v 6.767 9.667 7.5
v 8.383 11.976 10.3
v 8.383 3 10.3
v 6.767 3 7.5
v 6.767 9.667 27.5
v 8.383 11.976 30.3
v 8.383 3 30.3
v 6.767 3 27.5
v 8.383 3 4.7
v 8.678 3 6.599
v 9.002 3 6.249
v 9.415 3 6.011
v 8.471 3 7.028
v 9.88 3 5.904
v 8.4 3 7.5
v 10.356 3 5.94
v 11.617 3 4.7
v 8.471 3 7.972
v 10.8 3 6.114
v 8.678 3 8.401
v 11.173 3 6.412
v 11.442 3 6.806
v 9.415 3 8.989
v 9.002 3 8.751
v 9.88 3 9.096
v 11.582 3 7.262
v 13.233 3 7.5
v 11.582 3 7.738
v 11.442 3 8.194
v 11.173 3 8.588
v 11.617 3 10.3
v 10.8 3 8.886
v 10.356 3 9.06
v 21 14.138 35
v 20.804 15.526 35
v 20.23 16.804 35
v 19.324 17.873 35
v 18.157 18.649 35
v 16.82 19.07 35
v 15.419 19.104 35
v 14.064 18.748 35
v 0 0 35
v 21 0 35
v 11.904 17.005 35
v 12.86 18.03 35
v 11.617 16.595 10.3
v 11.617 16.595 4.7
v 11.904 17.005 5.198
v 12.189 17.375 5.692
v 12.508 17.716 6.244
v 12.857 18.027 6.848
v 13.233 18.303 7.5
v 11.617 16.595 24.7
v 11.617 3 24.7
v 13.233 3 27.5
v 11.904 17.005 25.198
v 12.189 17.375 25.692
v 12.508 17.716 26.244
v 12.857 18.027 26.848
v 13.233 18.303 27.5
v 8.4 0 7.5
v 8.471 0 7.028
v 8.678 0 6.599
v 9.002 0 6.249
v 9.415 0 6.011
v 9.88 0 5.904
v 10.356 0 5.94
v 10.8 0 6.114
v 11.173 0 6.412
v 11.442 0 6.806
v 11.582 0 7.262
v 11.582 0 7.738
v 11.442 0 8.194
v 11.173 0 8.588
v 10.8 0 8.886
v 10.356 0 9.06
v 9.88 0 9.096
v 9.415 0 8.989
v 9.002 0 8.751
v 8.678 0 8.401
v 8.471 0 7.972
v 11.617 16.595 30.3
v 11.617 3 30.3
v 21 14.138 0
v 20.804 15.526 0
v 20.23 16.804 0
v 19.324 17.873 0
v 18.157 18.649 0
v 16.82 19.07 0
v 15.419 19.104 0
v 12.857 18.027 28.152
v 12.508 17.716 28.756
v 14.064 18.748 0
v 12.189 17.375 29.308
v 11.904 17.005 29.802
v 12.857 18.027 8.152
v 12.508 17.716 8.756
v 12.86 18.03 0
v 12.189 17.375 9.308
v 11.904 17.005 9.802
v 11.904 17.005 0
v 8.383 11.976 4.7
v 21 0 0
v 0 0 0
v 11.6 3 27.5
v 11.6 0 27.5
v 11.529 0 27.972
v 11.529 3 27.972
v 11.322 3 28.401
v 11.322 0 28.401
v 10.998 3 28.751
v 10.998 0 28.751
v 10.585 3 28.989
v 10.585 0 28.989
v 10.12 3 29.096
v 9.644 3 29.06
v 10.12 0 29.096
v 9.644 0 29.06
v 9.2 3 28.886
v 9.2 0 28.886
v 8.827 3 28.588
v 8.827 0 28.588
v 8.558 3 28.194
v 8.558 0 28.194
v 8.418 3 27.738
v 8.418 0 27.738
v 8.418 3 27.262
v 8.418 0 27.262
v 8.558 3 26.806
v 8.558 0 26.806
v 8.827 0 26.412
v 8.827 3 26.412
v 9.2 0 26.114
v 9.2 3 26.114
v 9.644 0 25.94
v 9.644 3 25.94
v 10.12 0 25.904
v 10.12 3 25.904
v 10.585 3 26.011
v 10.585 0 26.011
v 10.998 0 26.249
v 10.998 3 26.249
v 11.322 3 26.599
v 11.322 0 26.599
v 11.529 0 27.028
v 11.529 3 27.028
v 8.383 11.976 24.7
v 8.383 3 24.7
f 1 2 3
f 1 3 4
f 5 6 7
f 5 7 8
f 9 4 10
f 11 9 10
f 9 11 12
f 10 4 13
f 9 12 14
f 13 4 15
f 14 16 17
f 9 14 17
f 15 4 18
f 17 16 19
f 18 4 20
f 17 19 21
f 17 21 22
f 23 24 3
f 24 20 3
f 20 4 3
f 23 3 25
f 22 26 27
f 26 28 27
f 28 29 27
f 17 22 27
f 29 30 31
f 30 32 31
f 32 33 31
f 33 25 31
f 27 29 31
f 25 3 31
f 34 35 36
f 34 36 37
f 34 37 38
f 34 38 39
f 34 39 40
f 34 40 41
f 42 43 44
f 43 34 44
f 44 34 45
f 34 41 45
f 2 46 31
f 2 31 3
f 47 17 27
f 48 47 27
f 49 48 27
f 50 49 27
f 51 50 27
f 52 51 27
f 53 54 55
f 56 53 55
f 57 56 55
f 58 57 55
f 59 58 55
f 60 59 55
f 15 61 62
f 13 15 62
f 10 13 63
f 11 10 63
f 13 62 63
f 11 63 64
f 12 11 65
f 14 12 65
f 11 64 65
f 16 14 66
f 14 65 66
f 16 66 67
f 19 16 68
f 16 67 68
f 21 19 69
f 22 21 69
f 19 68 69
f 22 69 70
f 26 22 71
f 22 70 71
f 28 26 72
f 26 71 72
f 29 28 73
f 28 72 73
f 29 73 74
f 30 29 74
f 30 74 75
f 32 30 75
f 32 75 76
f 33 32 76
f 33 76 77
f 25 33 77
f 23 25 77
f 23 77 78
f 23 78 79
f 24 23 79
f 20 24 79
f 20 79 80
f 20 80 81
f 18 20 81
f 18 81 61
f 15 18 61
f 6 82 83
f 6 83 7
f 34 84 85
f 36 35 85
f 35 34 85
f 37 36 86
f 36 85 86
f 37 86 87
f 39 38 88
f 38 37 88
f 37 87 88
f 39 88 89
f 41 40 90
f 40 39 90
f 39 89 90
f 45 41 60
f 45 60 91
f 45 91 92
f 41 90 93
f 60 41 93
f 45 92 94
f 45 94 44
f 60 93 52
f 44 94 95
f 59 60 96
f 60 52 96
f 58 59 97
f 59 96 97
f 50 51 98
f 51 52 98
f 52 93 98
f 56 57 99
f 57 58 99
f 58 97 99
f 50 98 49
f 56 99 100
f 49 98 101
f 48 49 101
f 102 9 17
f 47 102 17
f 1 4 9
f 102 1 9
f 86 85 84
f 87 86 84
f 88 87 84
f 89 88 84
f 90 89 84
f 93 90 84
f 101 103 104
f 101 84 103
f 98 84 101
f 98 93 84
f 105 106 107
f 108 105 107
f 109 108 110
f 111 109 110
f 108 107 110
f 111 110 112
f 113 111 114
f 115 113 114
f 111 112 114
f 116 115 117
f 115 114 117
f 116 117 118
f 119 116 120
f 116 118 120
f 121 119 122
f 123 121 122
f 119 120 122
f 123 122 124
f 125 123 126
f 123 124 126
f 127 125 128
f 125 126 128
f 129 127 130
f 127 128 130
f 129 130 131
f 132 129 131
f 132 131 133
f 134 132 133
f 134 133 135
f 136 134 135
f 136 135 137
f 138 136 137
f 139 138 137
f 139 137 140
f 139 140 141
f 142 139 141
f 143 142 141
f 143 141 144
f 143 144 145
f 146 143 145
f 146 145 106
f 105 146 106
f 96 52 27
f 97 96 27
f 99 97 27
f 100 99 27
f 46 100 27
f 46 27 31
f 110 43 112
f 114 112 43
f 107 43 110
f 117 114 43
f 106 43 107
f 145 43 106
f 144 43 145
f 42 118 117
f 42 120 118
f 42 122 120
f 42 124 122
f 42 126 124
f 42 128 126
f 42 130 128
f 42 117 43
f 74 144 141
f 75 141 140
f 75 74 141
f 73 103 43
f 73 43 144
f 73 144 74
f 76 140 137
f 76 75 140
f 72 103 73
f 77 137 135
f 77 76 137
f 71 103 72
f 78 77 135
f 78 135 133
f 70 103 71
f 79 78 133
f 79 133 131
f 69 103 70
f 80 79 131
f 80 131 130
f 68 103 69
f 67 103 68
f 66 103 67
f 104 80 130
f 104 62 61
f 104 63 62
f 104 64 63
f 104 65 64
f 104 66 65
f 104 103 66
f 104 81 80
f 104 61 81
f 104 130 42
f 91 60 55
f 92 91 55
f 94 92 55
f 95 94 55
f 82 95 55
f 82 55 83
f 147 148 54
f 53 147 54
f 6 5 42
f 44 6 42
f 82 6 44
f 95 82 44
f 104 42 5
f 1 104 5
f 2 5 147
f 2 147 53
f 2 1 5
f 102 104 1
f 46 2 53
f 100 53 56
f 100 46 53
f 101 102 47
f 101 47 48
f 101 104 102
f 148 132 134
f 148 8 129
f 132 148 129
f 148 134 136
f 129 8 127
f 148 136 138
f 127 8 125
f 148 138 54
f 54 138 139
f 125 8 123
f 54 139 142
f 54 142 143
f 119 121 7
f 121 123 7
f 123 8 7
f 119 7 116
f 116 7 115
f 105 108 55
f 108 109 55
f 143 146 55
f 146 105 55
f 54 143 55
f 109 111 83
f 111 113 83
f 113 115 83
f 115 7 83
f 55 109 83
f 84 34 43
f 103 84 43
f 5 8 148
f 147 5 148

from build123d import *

# Parameters (mm, degrees)
BOSS_EXTRUDE1_DEPTH = 35
SKETCH2_R           = 1.6
CUT_EXTRUDE1_DEPTH  = 51.655700568
CUT_EXTRUDE2_START  = -3
CUT_EXTRUDE2_DEPTH  = 48.655700568
FILLET1_R           = 5


with BuildPart() as part:
    # Sketch1 → Boss-Extrude1 (new body)
    with BuildSketch(Plane.XY):
        Polygon((0, 0), (21, 30), (21, 0), align=None)
    extrude(amount=BOSS_EXTRUDE1_DEPTH)

    # Sketch2 → Cut-Extrude1 (cut, through all)
    with BuildSketch(Plane.XZ):
        with Locations((10, 27.5)):
            Circle(SKETCH2_R)
        with Locations(Location((10, 7.5, 0), (0, 0, 180))):
            Circle(SKETCH2_R)
    extrude(amount=-CUT_EXTRUDE1_DEPTH, mode=Mode.SUBTRACT)

    # Sketch3 → Cut-Extrude2 (cut, through all)
    with BuildSketch(Plane.XZ.offset(CUT_EXTRUDE2_START)):
        Polygon((13.233161507, 27.5), (11.616580754, 30.3), (8.383419246, 30.3), (6.766838493, 27.5), (8.383419246, 24.7), (11.616580754, 24.7), align=None)
        Polygon((13.233161507, 7.5), (11.616580754, 10.3), (8.383419246, 10.3), (6.766838493, 7.5), (8.383419246, 4.7), (11.616580754, 4.7), align=None)
    extrude(amount=-CUT_EXTRUDE2_DEPTH, mode=Mode.SUBTRACT)

    # Fillet1
    # the kernel refuses this fillet: 5 mm, written as the material it takes off along each edge
    with BuildSketch(Plane(origin=(21, 30, -39.6545636), x_dir=(-0.5734623443633282, -0.8192319205190405, 0), z_dir=(0, 0, 1))) as fillet1_piece_1:
        with BuildLine():
            CenterArc((FILLET1_R * 3.17236508796, FILLET1_R), FILLET1_R, 124.992020199, 145.007979801)
            Line((FILLET1_R * 2.5989027436, FILLET1_R * 1.81923192052), (0, 0))
            Line((0, 0), (FILLET1_R * 3.17236508796, 0))
        make_face()
    extrude(amount=114.309127199, mode=Mode.SUBTRACT)


solid = part.part
